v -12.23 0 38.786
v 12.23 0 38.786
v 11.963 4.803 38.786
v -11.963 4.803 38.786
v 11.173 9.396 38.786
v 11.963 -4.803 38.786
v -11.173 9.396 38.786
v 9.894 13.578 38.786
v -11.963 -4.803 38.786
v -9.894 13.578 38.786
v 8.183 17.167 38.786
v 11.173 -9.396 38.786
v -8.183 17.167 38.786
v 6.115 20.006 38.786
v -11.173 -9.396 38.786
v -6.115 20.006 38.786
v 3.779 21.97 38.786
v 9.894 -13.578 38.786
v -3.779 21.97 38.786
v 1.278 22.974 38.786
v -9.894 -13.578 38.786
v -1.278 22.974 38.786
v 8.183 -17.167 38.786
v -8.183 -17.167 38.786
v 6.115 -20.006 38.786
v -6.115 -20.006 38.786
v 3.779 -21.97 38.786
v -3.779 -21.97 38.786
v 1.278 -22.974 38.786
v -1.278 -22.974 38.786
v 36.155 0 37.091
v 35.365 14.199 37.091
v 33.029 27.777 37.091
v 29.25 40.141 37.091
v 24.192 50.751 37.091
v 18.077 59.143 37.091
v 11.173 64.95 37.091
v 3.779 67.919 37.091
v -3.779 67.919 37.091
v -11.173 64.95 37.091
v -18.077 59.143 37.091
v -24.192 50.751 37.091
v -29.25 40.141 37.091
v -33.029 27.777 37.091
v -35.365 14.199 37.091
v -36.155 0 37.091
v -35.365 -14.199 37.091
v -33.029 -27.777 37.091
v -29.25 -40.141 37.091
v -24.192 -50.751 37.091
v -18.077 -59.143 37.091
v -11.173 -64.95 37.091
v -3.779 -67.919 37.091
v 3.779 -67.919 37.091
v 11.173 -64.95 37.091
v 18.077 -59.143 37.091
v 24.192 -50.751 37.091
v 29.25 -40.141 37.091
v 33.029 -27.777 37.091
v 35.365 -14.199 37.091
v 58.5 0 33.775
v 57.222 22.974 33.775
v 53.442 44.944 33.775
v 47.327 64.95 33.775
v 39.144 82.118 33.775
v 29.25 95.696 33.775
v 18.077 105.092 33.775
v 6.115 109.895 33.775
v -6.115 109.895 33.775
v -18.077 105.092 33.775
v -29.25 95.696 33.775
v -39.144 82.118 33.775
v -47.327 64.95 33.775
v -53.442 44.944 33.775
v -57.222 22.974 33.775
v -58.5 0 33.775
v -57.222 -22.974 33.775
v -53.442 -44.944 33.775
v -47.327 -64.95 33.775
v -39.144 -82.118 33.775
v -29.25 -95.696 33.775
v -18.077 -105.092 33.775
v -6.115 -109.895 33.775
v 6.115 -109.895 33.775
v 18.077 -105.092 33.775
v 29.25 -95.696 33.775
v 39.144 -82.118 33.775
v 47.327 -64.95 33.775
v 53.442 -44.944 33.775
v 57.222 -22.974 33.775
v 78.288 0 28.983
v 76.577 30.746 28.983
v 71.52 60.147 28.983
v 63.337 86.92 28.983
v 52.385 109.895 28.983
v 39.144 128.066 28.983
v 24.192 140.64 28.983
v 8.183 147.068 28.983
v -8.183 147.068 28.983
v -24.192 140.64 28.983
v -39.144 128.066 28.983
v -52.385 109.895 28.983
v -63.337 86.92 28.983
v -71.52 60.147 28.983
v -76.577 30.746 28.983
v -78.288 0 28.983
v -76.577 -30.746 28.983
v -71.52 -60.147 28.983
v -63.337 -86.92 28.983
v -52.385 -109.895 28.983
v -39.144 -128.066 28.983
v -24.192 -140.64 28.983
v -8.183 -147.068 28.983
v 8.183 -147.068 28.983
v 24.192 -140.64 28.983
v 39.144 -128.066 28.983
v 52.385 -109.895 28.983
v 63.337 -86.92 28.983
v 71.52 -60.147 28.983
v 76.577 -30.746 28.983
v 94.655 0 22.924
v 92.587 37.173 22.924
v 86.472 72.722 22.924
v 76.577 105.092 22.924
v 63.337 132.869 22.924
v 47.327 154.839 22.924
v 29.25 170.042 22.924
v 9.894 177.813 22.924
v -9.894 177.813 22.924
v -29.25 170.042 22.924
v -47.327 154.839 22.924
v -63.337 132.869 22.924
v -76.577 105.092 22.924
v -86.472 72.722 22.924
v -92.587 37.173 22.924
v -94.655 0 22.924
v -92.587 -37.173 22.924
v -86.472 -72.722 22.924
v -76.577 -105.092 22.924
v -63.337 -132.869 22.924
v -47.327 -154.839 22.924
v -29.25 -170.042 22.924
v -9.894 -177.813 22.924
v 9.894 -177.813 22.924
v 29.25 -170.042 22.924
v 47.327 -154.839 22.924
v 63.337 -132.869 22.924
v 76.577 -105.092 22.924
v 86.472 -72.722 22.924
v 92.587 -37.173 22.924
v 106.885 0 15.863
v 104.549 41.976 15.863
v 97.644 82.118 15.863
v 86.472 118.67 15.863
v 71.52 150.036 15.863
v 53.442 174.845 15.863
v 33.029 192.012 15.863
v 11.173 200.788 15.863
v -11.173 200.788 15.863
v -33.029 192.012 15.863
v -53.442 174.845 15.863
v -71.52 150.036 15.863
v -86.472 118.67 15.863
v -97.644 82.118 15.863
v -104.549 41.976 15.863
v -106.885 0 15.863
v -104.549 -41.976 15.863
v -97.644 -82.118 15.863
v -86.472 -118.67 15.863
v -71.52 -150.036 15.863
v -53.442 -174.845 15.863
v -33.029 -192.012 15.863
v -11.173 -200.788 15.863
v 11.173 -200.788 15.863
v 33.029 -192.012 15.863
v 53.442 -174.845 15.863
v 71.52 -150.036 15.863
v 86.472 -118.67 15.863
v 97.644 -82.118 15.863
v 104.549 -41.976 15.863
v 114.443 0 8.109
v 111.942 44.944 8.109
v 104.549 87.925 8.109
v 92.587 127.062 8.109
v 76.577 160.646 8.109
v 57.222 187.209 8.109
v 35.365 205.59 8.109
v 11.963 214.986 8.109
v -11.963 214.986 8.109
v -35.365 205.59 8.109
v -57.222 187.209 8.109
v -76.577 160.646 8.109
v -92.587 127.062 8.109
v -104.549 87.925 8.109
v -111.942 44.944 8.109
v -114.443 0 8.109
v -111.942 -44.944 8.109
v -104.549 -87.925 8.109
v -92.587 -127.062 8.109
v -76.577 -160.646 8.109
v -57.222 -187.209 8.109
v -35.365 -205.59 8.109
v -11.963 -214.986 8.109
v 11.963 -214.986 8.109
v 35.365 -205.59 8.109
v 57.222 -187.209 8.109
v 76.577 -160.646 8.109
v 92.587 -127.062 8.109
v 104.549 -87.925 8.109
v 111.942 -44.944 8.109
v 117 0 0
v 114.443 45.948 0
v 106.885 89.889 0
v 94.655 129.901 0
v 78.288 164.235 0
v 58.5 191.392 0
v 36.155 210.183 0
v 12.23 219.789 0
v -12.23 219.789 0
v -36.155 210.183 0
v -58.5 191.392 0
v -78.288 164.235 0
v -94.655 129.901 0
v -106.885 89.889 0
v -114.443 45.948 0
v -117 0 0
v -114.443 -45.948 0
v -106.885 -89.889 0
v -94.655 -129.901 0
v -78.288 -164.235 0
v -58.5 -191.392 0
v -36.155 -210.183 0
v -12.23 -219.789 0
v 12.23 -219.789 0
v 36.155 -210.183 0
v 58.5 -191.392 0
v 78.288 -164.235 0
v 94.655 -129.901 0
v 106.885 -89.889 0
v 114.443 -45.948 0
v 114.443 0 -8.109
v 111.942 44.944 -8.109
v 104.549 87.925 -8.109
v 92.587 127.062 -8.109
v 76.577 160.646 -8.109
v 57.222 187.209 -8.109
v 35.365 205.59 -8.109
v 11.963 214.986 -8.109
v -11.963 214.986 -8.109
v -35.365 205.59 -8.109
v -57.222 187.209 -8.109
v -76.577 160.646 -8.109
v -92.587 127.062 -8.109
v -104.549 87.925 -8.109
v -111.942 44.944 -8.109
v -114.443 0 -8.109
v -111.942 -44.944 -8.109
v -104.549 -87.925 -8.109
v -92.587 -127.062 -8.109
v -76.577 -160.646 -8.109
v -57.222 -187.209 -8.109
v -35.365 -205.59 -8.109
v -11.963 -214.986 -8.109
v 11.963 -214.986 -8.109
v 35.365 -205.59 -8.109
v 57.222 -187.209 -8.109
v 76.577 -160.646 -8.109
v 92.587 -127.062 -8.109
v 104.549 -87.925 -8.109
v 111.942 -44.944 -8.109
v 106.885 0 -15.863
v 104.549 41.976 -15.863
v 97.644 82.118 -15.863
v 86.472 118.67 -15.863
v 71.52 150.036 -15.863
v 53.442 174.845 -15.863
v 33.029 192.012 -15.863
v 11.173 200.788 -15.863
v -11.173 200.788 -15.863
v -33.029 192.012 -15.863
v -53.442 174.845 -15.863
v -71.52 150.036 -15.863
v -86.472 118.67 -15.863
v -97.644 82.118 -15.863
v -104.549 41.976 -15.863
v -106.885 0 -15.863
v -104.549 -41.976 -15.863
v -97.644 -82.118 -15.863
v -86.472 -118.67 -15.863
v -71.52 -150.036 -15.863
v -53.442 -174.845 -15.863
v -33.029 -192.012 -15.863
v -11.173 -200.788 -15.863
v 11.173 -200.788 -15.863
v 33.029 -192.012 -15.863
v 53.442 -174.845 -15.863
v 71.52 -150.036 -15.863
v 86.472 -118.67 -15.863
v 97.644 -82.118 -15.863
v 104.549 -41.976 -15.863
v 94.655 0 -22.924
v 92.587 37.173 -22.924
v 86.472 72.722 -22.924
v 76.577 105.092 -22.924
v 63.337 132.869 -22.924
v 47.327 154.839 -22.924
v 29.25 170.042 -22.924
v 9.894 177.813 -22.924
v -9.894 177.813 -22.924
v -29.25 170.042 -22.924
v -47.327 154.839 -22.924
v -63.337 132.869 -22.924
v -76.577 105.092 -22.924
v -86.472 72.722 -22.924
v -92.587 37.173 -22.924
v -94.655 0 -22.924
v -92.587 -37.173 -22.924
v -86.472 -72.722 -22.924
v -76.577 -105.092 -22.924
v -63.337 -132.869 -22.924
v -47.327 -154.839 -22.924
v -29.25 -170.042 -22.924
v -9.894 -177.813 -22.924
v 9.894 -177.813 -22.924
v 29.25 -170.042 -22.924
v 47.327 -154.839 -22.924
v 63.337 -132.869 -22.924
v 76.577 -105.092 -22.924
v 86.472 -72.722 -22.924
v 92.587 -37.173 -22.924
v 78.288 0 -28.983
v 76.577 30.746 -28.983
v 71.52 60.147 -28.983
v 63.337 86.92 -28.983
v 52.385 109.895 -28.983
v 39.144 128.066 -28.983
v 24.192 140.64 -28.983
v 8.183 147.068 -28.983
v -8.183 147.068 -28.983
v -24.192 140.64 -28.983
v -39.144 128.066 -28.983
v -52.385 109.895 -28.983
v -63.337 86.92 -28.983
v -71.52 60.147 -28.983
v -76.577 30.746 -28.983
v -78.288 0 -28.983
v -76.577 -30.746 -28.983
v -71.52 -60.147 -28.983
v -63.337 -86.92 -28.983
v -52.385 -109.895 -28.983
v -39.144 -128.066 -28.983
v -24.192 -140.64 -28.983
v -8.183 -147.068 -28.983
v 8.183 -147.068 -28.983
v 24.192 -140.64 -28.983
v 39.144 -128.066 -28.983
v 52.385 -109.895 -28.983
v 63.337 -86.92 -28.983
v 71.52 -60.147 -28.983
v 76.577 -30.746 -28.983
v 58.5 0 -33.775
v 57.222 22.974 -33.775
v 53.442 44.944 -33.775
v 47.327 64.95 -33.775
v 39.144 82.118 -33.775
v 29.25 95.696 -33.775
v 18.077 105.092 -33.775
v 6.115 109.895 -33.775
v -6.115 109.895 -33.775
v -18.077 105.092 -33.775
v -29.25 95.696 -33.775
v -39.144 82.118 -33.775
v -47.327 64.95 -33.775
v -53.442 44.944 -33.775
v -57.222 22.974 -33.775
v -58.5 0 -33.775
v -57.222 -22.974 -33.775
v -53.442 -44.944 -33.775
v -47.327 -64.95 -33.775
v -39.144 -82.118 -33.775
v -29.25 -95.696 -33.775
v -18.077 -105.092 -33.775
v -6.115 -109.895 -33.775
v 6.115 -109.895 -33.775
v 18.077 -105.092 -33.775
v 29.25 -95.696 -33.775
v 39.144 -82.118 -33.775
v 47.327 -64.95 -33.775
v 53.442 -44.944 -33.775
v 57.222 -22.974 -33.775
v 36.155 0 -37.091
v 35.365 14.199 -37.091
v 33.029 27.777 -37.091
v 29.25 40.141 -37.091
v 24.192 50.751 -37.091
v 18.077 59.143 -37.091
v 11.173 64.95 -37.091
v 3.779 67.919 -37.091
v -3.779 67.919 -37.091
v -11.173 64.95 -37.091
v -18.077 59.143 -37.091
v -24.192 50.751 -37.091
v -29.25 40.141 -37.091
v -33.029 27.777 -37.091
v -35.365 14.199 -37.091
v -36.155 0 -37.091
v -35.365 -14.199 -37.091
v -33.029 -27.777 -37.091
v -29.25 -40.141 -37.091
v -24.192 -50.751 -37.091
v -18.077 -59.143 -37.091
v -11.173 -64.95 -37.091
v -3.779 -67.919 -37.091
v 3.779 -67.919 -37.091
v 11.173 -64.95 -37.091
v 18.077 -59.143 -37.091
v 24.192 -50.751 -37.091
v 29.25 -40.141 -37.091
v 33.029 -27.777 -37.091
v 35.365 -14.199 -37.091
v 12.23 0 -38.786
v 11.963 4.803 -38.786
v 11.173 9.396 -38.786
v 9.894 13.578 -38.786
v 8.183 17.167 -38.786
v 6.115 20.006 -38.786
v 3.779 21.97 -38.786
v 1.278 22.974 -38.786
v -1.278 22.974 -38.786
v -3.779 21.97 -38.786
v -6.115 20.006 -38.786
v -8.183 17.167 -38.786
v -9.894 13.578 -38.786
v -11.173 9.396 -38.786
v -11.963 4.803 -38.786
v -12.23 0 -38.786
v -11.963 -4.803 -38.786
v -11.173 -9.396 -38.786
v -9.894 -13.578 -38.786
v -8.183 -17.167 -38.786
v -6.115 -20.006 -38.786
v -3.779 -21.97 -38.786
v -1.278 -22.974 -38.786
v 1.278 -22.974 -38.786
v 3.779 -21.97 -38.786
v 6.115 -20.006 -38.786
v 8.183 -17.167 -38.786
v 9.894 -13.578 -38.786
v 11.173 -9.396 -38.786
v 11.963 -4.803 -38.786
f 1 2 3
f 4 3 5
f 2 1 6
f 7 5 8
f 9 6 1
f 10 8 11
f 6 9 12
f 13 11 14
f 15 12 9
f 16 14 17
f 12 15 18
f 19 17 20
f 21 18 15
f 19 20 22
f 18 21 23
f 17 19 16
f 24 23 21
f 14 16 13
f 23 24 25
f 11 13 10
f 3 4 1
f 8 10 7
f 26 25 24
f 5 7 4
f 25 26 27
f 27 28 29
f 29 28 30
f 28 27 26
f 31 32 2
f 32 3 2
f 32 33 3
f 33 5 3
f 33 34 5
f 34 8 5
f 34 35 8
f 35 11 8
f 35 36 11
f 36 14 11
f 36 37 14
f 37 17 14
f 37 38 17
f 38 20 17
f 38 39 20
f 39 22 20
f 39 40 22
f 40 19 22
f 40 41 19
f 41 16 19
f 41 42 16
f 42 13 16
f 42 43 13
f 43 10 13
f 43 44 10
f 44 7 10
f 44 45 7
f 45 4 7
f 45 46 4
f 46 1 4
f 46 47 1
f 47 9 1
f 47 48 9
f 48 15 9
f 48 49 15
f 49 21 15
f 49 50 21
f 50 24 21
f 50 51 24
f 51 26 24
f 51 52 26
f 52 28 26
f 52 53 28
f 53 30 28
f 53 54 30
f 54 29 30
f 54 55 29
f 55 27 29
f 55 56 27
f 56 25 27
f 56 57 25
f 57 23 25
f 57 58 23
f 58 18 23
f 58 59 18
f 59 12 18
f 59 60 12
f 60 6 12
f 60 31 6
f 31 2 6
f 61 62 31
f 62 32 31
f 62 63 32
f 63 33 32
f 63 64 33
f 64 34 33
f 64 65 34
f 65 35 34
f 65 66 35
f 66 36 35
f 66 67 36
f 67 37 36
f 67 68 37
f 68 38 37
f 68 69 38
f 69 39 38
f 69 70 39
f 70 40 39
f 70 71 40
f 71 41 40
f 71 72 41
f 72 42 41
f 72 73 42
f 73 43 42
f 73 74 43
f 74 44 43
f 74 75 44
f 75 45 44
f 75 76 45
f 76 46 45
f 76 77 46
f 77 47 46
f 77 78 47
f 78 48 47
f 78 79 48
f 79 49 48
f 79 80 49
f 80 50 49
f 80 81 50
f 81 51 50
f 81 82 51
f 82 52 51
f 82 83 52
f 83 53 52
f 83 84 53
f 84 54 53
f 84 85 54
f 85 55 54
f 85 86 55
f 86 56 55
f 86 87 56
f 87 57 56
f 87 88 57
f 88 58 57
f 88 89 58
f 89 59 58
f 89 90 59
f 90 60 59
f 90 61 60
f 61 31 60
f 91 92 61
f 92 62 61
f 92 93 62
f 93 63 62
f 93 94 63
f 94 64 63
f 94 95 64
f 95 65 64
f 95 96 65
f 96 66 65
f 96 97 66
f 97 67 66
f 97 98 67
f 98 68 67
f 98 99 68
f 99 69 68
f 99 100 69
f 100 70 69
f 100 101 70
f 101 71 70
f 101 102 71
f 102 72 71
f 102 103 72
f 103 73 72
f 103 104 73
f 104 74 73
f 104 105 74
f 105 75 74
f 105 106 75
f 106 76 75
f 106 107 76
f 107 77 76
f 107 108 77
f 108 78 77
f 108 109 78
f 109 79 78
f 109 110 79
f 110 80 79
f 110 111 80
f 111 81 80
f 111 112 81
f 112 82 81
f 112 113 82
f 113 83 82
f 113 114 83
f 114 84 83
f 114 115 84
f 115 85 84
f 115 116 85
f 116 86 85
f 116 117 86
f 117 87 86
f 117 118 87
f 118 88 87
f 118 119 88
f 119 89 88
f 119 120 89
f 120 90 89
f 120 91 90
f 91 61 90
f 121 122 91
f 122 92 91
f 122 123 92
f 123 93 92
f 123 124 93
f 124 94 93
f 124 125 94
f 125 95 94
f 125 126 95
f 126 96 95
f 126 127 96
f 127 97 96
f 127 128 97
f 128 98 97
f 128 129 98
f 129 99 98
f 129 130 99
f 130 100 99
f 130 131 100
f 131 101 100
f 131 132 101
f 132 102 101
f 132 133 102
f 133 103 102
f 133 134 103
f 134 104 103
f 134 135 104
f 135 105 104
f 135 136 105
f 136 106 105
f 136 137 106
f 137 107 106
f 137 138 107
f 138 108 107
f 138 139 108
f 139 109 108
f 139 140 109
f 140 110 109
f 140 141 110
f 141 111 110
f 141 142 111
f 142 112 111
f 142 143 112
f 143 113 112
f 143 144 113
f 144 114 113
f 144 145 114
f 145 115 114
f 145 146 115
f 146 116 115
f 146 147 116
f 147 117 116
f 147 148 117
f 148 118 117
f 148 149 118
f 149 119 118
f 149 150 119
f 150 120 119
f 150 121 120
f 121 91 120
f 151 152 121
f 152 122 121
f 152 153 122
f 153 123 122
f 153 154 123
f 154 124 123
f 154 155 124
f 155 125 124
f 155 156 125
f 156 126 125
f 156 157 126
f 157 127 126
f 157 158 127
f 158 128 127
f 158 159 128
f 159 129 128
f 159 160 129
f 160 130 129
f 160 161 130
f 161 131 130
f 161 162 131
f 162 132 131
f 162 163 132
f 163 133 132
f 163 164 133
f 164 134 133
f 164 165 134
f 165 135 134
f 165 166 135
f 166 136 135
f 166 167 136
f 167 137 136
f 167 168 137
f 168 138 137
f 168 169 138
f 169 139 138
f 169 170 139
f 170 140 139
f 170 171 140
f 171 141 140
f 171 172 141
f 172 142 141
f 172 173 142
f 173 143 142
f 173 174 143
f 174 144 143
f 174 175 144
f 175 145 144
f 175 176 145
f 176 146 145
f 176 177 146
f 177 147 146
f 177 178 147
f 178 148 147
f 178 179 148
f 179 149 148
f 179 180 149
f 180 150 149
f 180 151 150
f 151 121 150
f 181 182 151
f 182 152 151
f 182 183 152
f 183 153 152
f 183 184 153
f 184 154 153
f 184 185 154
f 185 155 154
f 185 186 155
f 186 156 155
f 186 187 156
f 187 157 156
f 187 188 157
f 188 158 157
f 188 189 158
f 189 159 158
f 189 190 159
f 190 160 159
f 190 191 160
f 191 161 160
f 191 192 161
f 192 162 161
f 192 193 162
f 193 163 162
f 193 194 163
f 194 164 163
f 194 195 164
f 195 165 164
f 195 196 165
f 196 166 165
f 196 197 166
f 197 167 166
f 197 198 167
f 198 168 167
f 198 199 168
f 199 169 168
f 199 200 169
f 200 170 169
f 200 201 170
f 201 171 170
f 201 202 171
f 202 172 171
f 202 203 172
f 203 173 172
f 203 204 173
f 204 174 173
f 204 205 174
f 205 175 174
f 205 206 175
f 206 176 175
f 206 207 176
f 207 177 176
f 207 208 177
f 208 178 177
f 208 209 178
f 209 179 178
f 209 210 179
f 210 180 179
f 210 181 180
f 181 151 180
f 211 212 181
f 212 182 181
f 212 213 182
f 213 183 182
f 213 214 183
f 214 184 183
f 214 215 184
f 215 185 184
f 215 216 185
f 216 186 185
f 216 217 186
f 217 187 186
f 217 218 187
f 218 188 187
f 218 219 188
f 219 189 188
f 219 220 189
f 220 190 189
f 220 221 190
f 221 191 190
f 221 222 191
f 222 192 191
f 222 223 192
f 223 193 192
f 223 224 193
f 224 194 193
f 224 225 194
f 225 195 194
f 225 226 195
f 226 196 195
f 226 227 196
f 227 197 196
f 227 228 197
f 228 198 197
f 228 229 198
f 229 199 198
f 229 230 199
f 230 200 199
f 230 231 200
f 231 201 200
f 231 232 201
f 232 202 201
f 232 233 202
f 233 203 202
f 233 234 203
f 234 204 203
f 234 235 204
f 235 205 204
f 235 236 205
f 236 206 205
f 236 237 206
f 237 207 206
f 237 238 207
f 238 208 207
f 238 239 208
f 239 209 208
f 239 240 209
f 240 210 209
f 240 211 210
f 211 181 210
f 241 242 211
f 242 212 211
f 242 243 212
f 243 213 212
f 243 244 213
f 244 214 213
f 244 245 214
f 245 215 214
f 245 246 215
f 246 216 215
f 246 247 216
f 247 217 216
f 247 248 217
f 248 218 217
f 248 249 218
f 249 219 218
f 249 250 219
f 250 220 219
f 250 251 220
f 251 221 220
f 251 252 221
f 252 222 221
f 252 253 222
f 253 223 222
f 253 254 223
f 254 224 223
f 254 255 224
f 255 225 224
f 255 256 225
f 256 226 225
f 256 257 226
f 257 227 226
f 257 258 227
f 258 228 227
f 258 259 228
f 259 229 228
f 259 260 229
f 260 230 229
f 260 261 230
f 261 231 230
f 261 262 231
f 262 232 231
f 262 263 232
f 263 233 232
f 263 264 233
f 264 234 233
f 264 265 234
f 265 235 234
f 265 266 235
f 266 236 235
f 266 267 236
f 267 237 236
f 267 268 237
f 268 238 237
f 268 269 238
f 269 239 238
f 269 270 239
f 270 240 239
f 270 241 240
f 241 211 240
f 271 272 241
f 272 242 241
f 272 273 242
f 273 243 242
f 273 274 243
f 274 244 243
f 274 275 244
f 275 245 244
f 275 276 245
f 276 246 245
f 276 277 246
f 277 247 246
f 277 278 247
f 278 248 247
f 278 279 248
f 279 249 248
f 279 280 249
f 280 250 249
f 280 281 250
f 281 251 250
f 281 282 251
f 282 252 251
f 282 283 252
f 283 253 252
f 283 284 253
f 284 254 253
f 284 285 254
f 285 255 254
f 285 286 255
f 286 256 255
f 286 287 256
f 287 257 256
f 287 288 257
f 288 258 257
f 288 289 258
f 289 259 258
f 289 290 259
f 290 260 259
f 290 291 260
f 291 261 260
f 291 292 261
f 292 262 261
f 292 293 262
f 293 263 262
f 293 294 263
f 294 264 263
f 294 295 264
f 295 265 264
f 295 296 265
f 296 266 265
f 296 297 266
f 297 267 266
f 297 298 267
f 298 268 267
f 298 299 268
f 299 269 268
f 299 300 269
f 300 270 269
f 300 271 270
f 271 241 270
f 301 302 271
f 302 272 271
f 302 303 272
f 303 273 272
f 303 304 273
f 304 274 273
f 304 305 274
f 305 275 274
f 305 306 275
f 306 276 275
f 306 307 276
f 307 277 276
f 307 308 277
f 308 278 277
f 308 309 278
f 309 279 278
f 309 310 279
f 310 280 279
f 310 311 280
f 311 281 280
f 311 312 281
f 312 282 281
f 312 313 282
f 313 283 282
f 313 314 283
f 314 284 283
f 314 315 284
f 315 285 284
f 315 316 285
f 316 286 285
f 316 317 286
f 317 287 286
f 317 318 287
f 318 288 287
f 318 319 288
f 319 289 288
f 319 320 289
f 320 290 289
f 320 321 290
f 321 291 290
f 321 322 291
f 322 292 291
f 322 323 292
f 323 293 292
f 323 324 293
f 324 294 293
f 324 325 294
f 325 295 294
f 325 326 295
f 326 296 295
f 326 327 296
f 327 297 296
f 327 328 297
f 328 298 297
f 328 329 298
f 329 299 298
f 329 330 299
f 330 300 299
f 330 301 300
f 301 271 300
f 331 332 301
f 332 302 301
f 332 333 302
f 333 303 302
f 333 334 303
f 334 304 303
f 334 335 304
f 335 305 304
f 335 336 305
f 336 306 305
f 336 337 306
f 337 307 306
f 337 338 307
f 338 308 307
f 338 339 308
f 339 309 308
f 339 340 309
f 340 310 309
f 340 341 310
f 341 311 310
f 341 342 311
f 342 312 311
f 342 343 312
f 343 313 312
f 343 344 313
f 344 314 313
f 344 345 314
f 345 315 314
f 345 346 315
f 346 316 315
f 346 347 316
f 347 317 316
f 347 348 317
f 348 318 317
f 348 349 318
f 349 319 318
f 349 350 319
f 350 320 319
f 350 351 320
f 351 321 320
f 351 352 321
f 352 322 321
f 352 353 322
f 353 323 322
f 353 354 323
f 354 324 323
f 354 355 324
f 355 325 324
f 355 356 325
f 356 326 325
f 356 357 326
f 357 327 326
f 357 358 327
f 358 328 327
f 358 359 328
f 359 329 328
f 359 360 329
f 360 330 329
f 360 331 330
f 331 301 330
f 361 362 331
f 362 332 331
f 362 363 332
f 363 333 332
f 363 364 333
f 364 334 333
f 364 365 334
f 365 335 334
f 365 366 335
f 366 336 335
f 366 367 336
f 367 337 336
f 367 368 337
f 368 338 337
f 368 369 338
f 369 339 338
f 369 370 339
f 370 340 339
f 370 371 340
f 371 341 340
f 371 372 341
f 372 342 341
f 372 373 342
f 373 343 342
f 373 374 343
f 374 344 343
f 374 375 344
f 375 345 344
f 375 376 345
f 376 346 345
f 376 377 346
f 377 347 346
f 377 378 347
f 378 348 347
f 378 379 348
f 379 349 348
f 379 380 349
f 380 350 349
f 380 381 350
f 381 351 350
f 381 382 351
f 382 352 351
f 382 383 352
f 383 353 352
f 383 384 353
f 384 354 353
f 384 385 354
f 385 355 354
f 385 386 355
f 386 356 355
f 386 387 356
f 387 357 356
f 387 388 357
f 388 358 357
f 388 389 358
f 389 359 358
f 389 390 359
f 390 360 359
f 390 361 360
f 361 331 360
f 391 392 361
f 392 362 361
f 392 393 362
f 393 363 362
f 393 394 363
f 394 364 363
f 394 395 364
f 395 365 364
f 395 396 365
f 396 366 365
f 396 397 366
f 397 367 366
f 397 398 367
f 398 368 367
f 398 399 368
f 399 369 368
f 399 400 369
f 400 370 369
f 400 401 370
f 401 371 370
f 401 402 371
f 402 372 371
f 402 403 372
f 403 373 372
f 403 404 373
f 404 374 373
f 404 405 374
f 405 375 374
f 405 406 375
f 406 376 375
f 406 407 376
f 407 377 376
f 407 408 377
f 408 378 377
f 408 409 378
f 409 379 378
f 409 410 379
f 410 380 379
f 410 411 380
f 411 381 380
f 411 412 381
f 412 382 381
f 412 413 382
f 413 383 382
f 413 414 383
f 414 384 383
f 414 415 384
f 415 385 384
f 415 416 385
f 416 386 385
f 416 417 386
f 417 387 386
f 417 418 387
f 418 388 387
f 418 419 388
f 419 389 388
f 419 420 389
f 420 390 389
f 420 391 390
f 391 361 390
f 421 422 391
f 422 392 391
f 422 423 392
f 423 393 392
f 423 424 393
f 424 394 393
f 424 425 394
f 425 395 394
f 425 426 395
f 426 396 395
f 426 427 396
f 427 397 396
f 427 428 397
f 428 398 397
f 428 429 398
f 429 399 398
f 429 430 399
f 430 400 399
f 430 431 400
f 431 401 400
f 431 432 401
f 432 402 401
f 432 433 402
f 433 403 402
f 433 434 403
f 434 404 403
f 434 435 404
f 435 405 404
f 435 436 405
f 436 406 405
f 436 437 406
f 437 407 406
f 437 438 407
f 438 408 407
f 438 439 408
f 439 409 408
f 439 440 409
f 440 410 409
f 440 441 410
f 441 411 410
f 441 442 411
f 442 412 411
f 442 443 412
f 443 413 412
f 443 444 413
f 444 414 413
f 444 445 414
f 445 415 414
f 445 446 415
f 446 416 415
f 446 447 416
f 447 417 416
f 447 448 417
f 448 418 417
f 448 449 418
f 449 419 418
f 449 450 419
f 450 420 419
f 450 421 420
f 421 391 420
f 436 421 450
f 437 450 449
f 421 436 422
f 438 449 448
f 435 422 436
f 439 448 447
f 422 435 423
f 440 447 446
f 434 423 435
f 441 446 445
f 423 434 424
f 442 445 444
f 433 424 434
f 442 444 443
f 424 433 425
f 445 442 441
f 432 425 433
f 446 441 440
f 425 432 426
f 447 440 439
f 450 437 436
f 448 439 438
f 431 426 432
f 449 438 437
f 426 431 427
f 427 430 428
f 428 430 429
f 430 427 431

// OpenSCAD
// Generated by SolidPython 1.0.1 on 2020-07-29 00:46:49


scale(v = [9, 17, 3]) {
	sphere(r = 13);
}
/***********************************************
*********      SolidPython code:      **********
************************************************
 
# import packages: SolidPython
from solid import *
from solid.utils import *
from itertools import chain, combinations, permutations


class Resize:

    def __init__(self, scad_file):
        self.scad_file = scad_file
        #self.scad_file = import_scad(scad_file)
        # cone/cylinder param:
        self.r1 = 0
        self.r2 = 0
        self.h = 0
        # rectangular prism param:
        self.w = 0
        self.l = 0
        # ellipse param:
        self.r = 0

    # import OpenScad code (file name corresponds to shape)


    # classify shape + parameters
    def assign(self, param1, param2, param3):
        if self.scad_file == 'cone.scad':
            self.r1 = param1
            self.r2 = param2
            self.h = param3
        elif self.scad_file == 'cylinder.scad':
            self.r1 = param1
            self.r2 = param2
            self.h = param3
        elif self.scad_file == 'rectangularPrism.scad':
            self.h = param1
            self.l = param2
            self.w = param3
        else:
            self.r = param1
            self.h = param2

    # resize parameters
    def iterate(self):
        x = range(3, 20, 2)
        i = 1
        if self.scad_file == 'cone.scad':
            tempList = list(permutations(x, 2))
            for temp in tempList:
                param1 = temp[0]
                param2 = temp[1]
                filepath = 'produced_scad_files/' + 'cone' + str(param1) + '_' + str(param2) + '_' + '.scad'
                scad_render_to_file(cylinder(h=param1, r1=param2, r2=0), filepath)

        elif self.scad_file == 'cylinder.scad':
            tempList = list(permutations(x, 3))
            for temp in tempList:
                param1 = temp[0]
                param2 = temp[1]
                filepath = 'produced_scad_files/' + 'cylinder' + str(param1) + '_' + str(param2) + '_' + '.scad'
                scad_render_to_file(cylinder(h=param1, r1=param2, r2=param2), filepath)

        elif self.scad_file == 'rectangularPrism.scad':
            tempList = list(permutations(x, 3))
            for temp in tempList:
                param1 = temp[0]
                param2 = temp[1]
                param3 = temp[2]
                filepath = 'produced_scad_files/' + 'rectangularPrism' + str(param1) + '_' + str(param2) + '_' + str(
                    param3) + '.scad'
                scad_render_to_file(cube(size=(param1, param2, param3)), filepath)

        elif self.scad_file == 'ellipse.scad':
            tempList = list(permutations(x, 4))
            for temp in tempList:
                param1 = temp[0]
                param2 = temp[1]
                param3 = temp[2]
                param4 = temp[3]
                filepath = 'produced_scad_files/' + 'ellipse' + str(param1) + '_' + str(param2) + '_' + str(param3) + '_' + str(param4) + '.scad'
                scad_render_to_file(scale([param1, param2, param3])(sphere(r=param4)), filepath)

    def render_to_scadfile(self):
        scad_render_to_file(scad, 'example.scad') 
 
************************************************/
